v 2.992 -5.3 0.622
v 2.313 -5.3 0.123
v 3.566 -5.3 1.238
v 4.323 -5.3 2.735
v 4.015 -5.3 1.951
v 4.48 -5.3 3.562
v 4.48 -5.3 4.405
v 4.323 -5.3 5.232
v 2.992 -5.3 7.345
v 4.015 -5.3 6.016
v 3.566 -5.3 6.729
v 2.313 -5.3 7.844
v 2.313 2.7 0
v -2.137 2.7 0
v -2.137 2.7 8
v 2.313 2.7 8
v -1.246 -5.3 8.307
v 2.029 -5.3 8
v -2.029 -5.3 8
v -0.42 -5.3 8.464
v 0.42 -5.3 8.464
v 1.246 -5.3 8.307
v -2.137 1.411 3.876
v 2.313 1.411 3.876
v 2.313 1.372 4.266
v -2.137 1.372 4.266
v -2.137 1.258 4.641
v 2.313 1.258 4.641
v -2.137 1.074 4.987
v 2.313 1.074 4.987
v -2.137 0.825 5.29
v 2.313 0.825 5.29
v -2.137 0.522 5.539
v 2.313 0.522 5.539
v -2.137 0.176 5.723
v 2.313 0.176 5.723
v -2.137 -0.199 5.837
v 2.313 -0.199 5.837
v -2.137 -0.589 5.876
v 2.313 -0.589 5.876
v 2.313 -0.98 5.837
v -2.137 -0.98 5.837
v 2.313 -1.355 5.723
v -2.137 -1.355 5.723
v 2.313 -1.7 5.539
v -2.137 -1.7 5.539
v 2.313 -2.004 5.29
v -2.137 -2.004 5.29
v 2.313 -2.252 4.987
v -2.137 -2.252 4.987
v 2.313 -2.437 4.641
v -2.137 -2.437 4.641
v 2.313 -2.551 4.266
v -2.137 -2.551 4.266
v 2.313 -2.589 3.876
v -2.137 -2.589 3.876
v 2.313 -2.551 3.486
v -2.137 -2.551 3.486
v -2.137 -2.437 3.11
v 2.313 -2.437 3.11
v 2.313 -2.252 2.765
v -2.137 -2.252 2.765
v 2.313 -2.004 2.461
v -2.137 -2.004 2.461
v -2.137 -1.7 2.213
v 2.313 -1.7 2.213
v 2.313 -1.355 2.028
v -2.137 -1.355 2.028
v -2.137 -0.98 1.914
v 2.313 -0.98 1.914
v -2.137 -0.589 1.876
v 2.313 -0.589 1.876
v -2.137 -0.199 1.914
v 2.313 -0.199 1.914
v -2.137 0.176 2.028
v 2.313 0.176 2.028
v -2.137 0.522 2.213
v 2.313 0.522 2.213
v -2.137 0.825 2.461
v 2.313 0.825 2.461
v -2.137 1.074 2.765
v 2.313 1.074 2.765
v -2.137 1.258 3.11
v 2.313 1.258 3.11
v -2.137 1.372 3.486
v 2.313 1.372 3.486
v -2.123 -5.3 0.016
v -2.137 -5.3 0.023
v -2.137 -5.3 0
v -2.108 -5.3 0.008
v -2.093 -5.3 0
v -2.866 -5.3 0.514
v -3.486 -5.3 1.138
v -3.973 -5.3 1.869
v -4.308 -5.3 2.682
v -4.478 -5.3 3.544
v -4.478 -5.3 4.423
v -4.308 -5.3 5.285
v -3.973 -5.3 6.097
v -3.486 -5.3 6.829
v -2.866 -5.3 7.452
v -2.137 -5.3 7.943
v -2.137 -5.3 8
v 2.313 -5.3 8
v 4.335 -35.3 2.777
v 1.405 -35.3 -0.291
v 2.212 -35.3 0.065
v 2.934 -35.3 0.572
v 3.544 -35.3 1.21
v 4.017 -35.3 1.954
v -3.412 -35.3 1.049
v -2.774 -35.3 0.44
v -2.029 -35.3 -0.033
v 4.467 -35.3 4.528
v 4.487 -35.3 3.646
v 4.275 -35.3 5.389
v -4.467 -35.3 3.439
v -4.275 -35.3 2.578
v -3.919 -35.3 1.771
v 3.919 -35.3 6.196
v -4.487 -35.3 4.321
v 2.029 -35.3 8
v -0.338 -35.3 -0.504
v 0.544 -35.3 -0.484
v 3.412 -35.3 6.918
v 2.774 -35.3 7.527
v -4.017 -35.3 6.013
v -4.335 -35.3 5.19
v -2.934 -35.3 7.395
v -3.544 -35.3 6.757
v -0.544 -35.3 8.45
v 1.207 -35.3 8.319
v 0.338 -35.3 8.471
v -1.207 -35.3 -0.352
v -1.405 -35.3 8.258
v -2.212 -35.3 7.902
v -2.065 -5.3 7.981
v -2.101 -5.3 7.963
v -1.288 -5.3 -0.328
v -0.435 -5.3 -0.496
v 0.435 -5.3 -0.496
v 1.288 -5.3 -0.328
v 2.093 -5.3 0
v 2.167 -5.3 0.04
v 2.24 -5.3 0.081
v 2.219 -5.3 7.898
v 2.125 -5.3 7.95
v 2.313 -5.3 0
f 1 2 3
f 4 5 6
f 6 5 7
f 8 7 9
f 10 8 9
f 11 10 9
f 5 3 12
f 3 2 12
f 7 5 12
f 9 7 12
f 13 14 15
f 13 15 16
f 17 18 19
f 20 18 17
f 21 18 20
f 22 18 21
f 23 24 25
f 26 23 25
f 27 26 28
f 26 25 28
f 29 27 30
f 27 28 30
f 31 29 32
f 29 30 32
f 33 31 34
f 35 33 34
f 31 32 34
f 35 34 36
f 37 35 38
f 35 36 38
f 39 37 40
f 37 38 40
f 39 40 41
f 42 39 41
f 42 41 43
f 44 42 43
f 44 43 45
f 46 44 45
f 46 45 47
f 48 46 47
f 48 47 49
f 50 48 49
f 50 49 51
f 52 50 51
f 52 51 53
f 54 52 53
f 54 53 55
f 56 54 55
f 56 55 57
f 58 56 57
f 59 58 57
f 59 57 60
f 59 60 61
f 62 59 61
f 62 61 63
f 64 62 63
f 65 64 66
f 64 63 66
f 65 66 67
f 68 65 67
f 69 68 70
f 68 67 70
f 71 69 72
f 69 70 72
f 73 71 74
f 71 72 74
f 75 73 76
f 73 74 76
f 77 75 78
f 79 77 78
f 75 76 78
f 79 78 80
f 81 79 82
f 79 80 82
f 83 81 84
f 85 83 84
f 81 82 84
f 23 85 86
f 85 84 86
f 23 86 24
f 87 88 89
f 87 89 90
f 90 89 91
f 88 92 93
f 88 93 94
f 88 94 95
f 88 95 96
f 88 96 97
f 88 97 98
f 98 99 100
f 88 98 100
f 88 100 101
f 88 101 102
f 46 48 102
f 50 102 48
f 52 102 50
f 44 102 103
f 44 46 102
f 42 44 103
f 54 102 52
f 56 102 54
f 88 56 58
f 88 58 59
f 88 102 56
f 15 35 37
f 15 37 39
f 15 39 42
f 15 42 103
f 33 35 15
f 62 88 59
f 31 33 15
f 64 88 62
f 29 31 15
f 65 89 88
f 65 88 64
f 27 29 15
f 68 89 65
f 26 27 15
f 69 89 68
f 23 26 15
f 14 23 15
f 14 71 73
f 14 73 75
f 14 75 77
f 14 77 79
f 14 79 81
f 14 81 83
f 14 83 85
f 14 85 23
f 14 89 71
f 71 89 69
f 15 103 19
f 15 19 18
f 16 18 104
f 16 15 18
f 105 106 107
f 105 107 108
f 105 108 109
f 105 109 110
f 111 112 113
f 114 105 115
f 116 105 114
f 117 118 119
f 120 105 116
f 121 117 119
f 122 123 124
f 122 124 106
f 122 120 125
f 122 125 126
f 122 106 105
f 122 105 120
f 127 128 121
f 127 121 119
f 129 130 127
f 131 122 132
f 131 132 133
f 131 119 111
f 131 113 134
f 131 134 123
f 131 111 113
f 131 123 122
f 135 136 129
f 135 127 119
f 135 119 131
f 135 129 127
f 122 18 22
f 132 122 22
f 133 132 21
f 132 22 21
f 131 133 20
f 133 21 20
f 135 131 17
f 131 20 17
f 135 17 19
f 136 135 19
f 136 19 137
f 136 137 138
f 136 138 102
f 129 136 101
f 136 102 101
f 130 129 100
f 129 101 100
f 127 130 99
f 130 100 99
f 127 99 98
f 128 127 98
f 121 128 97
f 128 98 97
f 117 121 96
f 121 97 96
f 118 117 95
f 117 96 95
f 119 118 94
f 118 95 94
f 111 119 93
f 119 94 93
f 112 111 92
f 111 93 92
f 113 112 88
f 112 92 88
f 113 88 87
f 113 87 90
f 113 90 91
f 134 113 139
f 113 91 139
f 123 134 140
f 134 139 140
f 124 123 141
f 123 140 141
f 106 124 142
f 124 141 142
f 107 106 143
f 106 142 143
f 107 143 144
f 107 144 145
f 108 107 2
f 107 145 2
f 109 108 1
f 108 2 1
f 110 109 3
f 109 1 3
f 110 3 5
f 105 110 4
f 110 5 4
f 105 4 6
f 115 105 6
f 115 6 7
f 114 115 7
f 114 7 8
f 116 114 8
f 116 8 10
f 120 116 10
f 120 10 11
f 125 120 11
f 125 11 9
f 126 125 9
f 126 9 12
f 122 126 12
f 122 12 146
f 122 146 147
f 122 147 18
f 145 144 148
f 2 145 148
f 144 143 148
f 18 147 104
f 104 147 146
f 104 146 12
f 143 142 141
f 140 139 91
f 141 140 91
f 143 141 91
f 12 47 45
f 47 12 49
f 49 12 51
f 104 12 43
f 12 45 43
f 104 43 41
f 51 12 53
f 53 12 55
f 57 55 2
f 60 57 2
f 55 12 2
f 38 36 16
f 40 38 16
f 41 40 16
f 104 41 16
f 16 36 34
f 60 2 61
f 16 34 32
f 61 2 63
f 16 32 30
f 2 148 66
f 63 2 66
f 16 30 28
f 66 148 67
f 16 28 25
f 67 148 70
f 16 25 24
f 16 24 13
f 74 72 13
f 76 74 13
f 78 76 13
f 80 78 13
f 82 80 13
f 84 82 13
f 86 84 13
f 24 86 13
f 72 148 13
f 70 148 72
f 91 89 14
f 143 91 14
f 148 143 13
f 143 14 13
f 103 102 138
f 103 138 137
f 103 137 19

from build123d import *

# Parameters (mm, degrees)
ESQUISSE1_W             = 4.45
ESQUISSE1_H             = 8
BOSS_EXTRU_1_DEPTH      = 8
ESQUISSE2_R             = 4.5
BOSS_EXTRU_2_DEPTH      = 30
ESQUISSE4_R             = 2
ENL_V_MAT_EXTRU_1_DEPTH = 18


with BuildPart() as part:
    # Esquisse1 → Boss.-Extru.1 (new body)
    with BuildSketch(Plane.XY):
        with Locations((0.087605016, -1.300333333)):
            Rectangle(ESQUISSE1_W, ESQUISSE1_H)
    extrude(amount=BOSS_EXTRU_1_DEPTH)

    # Esquisse2 → Boss.-Extru.2 (add)
    with BuildSketch(Plane.XZ.offset(5.300333333)):
        with Locations(Location((0, 3.983435039, 0), (0, 0, 63.197988835))):
            Circle(ESQUISSE2_R)
    extrude(amount=BOSS_EXTRU_2_DEPTH)

    # Esquisse4 → Enlèv. mat.-Extru.1 (cut)
    with BuildSketch(Plane(origin=(2.312605016, 0, 0), x_dir=(0, 0, -1), z_dir=(1, 0, 0))):
        with Locations(Location((-3.87570667, -0.589342017, 0), (0, 0, 90))):
            Circle(ESQUISSE4_R)
    extrude(amount=-ENL_V_MAT_EXTRU_1_DEPTH, mode=Mode.SUBTRACT)


solid = part.part
